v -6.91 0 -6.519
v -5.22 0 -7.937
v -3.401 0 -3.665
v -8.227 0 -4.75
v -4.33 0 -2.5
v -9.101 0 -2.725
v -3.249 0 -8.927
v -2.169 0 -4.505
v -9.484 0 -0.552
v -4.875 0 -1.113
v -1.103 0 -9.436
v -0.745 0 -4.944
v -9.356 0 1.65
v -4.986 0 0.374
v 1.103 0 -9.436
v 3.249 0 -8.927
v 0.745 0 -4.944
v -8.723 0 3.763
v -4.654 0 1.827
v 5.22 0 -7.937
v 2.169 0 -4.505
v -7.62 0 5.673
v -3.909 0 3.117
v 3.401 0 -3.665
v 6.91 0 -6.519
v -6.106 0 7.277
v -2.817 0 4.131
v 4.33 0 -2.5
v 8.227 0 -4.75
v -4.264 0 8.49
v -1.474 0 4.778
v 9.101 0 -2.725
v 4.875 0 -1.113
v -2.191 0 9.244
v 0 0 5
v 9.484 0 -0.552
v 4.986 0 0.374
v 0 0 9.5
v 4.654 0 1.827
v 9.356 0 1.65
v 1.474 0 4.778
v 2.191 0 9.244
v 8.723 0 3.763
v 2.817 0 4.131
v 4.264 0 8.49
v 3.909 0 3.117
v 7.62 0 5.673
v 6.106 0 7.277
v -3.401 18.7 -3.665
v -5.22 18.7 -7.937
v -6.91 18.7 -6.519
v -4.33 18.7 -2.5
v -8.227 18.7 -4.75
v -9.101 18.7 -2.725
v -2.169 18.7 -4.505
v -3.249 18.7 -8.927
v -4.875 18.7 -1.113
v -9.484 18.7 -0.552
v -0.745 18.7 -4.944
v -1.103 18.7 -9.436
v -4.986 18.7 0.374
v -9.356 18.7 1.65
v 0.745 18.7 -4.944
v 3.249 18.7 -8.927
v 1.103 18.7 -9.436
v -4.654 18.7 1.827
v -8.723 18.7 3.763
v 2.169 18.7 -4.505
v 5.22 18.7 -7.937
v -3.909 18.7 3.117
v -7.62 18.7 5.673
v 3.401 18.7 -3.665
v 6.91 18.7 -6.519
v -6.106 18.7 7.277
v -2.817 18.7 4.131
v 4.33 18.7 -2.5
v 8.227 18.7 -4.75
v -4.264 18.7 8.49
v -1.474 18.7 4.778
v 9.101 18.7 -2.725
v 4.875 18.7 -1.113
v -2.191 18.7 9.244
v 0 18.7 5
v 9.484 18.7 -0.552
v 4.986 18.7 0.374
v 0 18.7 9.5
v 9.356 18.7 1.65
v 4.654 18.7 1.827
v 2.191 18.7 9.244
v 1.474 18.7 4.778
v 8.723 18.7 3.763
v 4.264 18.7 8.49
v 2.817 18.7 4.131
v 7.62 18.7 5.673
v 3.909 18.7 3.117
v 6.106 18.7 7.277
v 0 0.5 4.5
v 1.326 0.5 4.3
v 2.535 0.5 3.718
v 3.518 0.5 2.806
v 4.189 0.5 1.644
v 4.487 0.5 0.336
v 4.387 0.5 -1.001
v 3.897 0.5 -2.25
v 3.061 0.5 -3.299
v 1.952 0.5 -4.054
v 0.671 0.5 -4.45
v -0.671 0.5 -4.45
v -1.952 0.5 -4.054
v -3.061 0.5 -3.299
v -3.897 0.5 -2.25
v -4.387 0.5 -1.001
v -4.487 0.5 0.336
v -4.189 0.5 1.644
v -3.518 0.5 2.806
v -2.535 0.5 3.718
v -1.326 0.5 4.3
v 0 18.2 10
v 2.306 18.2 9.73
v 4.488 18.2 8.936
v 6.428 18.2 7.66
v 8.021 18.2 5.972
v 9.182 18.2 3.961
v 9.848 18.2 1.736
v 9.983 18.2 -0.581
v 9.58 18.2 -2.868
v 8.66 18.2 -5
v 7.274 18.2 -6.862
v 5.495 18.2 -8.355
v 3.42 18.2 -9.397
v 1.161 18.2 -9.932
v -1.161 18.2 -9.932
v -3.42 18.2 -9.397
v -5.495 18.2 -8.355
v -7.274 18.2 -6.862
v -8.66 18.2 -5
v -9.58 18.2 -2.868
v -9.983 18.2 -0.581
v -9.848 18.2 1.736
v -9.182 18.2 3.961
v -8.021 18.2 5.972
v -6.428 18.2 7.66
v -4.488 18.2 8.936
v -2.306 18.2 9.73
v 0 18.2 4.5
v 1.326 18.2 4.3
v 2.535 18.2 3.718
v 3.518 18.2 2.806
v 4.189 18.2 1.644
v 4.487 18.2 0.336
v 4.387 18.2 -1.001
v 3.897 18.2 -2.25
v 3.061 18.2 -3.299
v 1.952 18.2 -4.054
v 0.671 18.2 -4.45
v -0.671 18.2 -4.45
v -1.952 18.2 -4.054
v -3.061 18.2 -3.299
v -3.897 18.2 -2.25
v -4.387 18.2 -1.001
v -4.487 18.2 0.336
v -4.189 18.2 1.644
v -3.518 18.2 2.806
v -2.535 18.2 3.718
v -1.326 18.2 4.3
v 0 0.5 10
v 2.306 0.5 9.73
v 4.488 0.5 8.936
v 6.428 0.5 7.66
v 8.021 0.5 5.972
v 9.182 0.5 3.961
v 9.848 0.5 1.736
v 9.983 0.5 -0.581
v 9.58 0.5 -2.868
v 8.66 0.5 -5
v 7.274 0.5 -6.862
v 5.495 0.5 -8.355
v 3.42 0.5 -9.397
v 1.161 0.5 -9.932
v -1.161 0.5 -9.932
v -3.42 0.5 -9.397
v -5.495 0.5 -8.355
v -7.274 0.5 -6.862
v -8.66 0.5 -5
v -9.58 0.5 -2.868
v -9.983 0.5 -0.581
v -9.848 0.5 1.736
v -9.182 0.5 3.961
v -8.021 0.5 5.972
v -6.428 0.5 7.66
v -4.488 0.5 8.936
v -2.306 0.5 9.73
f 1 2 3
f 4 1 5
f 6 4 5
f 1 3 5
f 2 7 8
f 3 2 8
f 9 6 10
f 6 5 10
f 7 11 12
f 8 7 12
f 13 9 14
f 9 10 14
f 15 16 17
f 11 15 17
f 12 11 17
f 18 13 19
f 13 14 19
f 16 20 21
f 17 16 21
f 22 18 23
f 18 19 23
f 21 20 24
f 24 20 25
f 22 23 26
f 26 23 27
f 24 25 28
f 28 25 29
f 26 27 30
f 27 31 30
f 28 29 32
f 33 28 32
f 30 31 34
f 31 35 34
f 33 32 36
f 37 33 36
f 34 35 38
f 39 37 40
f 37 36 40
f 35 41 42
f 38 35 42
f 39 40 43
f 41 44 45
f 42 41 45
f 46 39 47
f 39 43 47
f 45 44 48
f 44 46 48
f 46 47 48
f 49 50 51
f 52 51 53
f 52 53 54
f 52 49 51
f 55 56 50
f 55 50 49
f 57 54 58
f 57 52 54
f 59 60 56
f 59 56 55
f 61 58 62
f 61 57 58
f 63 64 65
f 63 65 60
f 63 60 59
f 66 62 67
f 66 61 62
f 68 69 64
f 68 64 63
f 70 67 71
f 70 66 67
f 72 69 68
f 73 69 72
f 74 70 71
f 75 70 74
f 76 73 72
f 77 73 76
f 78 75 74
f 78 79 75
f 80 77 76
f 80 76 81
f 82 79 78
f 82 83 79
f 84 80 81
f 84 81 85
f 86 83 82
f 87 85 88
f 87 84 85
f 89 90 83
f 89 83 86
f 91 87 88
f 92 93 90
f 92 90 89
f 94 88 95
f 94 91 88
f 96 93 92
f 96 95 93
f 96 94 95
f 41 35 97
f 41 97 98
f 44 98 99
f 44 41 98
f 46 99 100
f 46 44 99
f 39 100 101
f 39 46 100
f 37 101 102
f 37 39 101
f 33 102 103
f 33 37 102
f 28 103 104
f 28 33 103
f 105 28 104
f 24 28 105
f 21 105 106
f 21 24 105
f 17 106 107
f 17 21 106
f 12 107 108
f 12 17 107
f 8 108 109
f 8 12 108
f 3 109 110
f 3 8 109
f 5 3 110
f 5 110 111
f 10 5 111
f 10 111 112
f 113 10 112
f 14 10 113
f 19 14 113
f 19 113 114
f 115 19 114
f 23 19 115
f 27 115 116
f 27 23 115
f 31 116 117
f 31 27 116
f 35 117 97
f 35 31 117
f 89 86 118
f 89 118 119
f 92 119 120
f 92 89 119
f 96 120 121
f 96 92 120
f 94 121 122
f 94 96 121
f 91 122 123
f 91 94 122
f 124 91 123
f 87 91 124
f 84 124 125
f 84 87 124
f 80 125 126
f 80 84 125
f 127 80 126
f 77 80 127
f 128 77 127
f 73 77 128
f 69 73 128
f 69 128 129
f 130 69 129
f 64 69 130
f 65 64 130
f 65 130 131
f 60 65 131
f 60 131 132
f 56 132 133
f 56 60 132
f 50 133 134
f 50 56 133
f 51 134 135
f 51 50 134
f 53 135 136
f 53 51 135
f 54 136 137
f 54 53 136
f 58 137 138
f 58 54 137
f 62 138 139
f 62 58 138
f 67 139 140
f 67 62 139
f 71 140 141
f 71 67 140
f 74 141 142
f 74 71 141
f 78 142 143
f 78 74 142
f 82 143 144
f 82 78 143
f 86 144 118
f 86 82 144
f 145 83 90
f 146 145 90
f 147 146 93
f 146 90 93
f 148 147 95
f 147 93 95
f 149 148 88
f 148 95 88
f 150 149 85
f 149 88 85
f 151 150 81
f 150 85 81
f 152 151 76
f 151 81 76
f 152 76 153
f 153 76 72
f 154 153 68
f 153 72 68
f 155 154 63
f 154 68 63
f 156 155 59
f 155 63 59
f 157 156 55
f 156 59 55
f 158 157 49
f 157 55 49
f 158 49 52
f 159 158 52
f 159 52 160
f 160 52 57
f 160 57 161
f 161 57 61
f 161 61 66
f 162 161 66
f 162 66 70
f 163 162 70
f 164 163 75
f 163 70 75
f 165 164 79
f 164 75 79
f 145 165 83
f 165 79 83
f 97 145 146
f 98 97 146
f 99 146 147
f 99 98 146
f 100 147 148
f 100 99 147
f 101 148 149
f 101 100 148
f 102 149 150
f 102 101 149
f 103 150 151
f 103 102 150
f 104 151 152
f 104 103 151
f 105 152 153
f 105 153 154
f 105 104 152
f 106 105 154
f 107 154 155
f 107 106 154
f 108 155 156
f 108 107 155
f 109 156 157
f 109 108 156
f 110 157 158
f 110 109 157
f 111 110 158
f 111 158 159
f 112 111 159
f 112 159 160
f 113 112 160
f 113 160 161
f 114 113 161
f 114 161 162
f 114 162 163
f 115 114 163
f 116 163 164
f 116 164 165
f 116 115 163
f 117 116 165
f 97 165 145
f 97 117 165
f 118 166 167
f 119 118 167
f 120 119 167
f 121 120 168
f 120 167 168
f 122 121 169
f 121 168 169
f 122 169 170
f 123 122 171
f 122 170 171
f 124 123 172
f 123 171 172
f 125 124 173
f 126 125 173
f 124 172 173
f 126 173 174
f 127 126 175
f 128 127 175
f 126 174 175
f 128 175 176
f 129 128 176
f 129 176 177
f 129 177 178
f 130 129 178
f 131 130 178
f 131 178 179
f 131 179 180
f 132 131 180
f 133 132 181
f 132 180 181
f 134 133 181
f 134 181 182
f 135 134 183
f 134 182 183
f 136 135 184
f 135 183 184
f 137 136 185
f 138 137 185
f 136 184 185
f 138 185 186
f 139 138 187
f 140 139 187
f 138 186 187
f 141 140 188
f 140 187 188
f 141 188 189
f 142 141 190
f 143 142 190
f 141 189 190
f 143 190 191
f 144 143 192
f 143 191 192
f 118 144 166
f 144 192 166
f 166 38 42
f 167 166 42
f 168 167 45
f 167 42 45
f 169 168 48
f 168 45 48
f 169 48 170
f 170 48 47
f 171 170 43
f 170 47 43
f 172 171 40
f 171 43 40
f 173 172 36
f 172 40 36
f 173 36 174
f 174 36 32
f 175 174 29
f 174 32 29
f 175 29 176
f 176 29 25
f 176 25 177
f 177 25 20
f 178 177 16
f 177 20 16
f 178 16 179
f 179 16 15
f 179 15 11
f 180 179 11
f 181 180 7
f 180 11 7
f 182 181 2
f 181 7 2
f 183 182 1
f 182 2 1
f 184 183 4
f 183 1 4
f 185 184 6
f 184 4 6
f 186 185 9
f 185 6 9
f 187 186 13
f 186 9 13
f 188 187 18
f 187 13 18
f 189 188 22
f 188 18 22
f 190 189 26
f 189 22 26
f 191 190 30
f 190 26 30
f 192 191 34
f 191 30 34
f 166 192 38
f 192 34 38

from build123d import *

# Parameters (mm, degrees)
SKETCH1_R     = 10
SKETCH1_R_2   = 4.5
BODY_DEPTH    = 18.7
CHAMFER1_SIZE = 0.5


with BuildPart() as part:
    # Sketch1 → Body (new body)
    with BuildSketch(Plane(origin=(0, 0, 0), x_dir=(1, 0, 0), z_dir=(0, 1, 0))):
        with Locations(Location((0, 0, 0), (0, 0, 270))):
            Circle(SKETCH1_R)
        with Locations(Location((0, 0, 0), (0, 0, 270))):
            Circle(SKETCH1_R_2, mode=Mode.SUBTRACT)
    extrude(amount=BODY_DEPTH)

    # Chamfer1
    chamfer1_edges = [part.edges().sort_by_distance(p)[0] for p in [
        (0, 0, -10),
        (0, 18.7, -10),
        (0, 0, -4.5),
        (0, 18.7, -4.5),
    ]]
    chamfer(chamfer1_edges, length=CHAMFER1_SIZE)


solid = part.part
